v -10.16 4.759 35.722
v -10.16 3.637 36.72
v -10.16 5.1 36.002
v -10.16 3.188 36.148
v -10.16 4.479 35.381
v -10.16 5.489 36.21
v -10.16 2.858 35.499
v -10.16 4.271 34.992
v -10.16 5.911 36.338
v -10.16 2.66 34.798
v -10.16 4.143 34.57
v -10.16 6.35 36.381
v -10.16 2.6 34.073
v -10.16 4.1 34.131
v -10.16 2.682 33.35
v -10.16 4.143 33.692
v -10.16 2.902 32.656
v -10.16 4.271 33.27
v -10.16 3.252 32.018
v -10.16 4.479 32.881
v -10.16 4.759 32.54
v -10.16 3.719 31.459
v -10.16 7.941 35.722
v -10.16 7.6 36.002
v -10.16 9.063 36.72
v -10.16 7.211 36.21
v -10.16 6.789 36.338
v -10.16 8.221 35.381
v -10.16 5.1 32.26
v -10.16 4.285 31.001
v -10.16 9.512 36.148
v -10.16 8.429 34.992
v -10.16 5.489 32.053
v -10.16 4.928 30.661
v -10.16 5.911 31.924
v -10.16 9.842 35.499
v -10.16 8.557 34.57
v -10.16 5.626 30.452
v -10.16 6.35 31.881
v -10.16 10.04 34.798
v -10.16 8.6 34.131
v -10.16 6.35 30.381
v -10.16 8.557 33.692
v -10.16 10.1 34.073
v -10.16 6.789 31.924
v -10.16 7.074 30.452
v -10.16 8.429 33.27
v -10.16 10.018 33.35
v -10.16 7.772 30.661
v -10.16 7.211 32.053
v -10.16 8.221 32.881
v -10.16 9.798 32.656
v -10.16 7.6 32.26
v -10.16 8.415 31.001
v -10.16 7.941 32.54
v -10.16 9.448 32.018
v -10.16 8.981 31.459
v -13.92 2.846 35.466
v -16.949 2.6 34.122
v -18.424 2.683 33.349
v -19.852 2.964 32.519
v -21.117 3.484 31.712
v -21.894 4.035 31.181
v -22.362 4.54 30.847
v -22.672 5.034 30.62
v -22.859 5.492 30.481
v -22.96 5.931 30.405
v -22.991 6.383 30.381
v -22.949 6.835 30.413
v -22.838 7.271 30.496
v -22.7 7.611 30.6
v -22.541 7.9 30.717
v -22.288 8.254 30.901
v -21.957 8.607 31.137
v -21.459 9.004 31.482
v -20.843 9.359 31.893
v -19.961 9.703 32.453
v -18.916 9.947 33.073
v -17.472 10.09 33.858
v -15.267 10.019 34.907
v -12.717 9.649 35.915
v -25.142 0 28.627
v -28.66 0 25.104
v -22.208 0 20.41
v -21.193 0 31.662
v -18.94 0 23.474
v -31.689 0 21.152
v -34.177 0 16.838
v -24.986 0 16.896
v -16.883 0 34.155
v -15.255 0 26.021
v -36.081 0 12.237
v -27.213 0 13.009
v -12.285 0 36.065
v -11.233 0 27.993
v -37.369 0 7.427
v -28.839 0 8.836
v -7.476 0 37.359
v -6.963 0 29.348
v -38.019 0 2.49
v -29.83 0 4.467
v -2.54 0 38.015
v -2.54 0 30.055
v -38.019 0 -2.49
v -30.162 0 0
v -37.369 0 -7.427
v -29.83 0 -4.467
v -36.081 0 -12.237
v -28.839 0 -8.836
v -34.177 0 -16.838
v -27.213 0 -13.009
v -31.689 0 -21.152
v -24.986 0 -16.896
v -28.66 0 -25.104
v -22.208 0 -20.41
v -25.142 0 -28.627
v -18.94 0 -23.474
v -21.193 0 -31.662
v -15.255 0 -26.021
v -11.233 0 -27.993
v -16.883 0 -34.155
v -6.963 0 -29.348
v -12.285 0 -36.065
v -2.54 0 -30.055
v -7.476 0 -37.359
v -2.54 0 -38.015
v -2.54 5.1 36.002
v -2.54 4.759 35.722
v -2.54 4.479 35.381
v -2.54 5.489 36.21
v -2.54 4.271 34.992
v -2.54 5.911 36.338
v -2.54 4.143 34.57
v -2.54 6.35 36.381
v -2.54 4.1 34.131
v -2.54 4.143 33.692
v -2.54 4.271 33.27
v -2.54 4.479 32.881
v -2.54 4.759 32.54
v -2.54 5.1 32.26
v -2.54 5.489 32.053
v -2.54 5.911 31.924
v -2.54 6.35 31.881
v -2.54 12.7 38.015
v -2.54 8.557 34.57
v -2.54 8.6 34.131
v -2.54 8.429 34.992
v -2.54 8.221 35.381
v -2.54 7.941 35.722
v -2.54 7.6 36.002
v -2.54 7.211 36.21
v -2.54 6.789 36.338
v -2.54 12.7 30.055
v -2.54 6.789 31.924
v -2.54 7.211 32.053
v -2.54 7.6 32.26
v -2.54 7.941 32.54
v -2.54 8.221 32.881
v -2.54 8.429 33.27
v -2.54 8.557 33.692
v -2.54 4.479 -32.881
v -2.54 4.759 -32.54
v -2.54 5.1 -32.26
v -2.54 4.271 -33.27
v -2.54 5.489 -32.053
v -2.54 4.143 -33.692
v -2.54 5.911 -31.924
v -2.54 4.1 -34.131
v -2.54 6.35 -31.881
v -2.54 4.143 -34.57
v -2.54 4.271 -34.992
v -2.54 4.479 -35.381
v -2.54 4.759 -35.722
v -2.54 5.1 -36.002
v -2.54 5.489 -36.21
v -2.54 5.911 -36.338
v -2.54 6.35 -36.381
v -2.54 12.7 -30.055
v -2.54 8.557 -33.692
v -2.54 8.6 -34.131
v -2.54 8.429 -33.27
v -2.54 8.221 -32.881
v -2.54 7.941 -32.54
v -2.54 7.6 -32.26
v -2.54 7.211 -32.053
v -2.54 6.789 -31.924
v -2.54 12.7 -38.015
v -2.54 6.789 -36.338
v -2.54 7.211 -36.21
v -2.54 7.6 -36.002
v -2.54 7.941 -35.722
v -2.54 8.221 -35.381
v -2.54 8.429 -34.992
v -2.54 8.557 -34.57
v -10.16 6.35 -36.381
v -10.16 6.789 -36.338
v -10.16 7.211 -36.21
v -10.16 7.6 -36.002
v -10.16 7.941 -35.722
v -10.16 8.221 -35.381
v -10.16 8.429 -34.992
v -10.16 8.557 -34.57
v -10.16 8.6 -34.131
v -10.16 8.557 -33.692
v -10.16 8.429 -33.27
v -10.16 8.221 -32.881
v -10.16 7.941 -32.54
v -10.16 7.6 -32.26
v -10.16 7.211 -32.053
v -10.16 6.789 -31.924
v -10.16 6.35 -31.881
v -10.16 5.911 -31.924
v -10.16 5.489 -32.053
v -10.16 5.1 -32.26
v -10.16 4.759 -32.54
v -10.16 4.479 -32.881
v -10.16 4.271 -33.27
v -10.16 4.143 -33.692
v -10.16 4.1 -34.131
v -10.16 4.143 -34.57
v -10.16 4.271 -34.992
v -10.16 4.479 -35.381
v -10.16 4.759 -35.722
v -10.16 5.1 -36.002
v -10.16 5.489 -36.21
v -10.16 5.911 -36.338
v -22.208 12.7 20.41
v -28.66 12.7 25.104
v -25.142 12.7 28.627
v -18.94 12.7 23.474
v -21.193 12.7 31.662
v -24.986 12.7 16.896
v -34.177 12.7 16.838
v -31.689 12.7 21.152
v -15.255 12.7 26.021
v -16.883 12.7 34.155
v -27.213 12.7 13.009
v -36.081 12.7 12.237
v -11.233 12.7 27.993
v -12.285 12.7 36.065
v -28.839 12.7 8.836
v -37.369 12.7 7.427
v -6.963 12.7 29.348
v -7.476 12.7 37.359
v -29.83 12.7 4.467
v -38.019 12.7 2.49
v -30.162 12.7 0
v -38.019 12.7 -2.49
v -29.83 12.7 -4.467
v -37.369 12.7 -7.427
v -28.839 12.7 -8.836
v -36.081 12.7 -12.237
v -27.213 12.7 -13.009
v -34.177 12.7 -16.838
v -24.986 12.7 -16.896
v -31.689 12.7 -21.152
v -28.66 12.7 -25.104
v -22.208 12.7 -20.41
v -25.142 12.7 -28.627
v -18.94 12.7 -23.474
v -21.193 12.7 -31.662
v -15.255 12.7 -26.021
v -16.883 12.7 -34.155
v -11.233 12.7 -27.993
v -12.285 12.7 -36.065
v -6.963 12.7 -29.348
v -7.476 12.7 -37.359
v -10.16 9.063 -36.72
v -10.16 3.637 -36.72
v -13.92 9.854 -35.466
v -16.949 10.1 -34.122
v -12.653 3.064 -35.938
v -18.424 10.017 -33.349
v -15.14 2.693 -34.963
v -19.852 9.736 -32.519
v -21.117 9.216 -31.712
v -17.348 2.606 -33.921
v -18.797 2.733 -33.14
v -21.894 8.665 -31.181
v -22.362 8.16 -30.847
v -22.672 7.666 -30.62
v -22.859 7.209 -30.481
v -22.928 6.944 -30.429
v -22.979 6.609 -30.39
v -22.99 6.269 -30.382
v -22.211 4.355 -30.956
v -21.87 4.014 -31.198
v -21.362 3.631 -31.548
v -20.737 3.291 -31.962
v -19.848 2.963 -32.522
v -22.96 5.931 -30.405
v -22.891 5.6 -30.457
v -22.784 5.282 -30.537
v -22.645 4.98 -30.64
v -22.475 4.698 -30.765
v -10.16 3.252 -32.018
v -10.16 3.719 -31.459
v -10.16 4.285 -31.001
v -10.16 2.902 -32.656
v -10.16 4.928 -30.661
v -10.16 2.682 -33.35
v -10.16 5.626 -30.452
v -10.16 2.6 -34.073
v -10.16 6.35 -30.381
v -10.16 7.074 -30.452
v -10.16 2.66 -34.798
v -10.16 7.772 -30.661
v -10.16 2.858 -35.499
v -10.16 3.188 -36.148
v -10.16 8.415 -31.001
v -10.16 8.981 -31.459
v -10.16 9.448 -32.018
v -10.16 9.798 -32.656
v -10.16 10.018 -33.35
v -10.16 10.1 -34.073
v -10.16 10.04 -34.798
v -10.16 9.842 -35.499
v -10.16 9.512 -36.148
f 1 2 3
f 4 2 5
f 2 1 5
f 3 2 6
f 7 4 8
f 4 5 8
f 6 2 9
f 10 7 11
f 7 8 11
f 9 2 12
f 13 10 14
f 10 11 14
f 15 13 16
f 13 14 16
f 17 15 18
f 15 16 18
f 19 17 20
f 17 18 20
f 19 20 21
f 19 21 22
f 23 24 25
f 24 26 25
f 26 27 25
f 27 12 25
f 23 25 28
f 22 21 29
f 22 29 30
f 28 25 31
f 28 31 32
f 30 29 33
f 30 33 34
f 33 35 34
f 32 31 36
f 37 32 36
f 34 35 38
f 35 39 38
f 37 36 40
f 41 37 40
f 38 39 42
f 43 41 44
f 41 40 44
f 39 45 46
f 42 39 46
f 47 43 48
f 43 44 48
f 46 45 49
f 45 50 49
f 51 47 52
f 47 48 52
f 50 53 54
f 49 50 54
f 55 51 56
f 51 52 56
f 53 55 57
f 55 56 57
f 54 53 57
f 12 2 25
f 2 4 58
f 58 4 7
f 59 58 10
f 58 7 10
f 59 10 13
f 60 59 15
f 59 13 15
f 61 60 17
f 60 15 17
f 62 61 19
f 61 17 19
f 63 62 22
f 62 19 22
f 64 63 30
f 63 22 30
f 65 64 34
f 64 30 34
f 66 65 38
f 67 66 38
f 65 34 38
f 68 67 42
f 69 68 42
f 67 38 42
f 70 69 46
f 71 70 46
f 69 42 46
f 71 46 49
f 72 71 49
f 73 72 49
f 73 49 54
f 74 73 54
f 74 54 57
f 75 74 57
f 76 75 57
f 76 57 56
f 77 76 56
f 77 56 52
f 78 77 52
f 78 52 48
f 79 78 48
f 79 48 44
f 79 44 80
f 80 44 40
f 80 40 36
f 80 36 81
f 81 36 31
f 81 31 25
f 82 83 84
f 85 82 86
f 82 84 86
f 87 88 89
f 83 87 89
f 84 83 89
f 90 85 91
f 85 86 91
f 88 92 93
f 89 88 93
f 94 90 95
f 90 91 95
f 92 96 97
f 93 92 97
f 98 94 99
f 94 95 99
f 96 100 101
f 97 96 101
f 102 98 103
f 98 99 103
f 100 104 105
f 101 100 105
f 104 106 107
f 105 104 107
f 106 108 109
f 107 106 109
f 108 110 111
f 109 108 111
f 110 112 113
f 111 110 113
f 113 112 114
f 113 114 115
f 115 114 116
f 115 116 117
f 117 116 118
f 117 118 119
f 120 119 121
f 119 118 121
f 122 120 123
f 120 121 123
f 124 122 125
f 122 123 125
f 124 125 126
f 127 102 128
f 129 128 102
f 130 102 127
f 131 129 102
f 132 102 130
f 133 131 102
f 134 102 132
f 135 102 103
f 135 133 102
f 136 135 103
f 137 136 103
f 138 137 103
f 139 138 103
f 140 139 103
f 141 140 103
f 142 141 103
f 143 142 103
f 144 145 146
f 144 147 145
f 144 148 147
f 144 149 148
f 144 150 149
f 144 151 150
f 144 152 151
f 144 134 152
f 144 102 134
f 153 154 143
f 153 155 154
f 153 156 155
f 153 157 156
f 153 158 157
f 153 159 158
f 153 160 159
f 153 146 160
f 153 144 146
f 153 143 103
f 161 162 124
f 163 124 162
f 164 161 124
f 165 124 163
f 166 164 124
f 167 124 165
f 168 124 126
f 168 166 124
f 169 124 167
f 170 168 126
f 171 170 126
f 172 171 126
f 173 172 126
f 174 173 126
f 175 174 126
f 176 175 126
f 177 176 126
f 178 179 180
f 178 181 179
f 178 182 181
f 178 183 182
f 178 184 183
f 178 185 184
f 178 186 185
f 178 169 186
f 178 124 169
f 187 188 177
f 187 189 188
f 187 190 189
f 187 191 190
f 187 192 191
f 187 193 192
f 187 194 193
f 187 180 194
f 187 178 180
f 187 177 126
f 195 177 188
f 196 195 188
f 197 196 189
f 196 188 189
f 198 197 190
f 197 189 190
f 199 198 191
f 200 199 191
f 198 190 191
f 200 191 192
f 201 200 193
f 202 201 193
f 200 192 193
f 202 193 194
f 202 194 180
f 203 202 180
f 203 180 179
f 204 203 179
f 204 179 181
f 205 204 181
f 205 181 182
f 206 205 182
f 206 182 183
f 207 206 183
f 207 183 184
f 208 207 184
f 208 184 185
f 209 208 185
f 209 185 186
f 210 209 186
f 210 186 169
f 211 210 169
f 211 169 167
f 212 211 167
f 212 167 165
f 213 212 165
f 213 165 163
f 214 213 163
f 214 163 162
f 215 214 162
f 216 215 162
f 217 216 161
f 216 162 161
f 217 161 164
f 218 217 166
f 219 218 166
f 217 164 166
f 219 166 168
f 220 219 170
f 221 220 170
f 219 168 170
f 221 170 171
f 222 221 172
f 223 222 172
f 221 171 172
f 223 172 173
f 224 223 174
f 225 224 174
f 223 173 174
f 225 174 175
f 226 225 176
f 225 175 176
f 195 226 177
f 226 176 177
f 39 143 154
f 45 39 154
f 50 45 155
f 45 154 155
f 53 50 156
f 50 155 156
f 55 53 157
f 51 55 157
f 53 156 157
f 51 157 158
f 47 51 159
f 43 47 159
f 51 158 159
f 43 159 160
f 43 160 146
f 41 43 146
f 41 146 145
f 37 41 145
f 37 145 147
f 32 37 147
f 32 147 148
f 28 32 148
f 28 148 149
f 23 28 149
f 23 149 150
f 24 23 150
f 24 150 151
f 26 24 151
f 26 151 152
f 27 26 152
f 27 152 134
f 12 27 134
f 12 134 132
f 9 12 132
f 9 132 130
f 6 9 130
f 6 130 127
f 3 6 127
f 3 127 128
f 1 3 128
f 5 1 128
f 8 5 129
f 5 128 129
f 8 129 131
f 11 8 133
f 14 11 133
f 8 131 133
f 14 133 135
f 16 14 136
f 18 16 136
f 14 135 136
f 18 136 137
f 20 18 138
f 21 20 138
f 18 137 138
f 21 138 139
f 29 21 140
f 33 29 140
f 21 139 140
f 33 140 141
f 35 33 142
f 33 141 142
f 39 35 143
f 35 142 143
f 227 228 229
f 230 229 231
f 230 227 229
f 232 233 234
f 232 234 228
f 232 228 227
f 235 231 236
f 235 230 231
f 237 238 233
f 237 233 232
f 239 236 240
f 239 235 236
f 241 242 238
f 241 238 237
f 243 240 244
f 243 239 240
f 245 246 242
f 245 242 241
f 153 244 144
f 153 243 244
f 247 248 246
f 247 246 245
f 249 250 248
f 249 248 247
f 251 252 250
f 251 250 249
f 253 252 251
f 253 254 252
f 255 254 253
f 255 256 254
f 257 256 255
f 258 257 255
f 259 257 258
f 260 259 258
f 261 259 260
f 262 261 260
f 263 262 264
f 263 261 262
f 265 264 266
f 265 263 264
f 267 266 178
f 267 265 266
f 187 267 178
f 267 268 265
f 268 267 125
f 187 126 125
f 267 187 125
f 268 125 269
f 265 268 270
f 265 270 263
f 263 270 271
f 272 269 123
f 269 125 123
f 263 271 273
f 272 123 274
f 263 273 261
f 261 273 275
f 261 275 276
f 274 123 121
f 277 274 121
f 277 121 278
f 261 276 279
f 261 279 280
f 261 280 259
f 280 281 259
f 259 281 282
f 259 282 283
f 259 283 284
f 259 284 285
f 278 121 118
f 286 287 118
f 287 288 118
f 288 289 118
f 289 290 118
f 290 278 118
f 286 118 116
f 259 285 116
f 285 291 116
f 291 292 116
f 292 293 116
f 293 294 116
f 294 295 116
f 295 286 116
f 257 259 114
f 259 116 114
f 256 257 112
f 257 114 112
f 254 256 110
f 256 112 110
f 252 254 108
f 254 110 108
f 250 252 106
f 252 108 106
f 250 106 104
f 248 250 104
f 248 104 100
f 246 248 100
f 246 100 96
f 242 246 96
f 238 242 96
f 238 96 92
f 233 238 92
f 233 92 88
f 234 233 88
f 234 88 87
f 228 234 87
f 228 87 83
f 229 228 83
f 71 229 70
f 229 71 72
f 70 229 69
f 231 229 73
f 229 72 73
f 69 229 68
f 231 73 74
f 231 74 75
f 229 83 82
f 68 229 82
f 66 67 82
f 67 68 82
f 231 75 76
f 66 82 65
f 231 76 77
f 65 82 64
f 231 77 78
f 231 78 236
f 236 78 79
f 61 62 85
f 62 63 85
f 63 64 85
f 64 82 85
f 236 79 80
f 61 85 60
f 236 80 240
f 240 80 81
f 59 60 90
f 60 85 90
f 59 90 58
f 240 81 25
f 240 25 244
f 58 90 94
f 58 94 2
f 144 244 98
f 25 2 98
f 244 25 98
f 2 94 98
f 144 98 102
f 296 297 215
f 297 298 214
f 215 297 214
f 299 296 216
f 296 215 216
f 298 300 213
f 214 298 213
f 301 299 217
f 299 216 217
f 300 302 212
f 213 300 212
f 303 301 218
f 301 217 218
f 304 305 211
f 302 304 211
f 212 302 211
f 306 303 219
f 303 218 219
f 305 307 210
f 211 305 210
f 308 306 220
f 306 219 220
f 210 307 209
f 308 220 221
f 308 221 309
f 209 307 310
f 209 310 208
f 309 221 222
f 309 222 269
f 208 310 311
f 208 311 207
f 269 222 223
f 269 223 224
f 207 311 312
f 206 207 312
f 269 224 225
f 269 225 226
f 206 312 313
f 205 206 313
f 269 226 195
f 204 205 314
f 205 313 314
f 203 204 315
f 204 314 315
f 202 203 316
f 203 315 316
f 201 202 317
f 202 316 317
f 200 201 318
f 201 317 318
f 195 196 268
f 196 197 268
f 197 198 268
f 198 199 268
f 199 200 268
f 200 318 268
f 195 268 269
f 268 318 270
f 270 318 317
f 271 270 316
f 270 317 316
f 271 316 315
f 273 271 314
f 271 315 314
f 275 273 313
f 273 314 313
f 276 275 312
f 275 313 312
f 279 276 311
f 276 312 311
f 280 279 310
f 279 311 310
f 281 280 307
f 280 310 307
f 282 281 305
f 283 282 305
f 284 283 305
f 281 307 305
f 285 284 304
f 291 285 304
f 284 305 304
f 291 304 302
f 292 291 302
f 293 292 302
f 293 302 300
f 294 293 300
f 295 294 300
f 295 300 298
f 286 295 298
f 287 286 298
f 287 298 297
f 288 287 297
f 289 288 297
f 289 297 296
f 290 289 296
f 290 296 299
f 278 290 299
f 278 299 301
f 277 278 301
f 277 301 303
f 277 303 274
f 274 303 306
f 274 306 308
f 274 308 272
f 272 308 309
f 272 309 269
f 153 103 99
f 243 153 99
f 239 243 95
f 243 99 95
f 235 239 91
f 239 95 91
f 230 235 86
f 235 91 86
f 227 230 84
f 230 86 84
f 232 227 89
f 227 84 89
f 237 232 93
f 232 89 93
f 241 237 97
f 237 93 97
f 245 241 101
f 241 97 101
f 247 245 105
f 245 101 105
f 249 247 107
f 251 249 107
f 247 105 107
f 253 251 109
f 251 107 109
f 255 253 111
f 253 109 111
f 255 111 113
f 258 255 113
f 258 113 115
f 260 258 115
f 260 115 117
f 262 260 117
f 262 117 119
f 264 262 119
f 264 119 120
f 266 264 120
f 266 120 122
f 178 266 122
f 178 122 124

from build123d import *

# Parameters (mm, degrees)
BOSS_EXTRUDE1_DEPTH = 12.7
SKETCH2_R           = 2.25
CUT_EXTRUDE1_DEPTH  = 39.1
CUT_EXTRUDE2_START  = -10.16
SKETCH3_R           = 3.75
CUT_EXTRUDE2_DEPTH  = 28.9400001
SKETCH4_W           = 2.54
SKETCH4_H           = 76.2
CUT_EXTRUDE3_DEPTH  = 13.7000001


with BuildPart() as part:
    # Sketch1 → Boss-Extrude1 (new body)
    with BuildSketch(Plane(origin=(0, 0, 0), x_dir=(1, 0, 0), z_dir=(0, 1, 0))):
        with BuildLine():
            Line((0, 30.1625), (0, 38.1))
            ThreePointArc((0, 38.1), (-38.1, 0), (0, -38.1))
            Line((0, -38.1), (0, -30.1625))
            ThreePointArc((0, -30.1625), (-30.1625, 0), (0, 30.1625))
        make_face()
    extrude(amount=BOSS_EXTRUDE1_DEPTH)

    # Sketch2 → Cut-Extrude1 (cut, through all)
    with BuildSketch(Plane(origin=(0, 0, 0), x_dir=(0, 0, -1), z_dir=(1, 0, 0))):
        with Locations((-34.13125, 6.35)):
            Circle(SKETCH2_R)
        with Locations((34.13125, 6.35)):
            Circle(SKETCH2_R)
    extrude(amount=-CUT_EXTRUDE1_DEPTH, mode=Mode.SUBTRACT)

    # Sketch3 → Cut-Extrude2 (cut, through all)
    with BuildSketch(Plane(origin=(0, 0, 0), x_dir=(0, 0, -1), z_dir=(1, 0, 0)).offset(CUT_EXTRUDE2_START)):
        with Locations((34.13125, 6.35)):
            Circle(SKETCH3_R)
        with Locations((-34.13125, 6.35)):
            Circle(SKETCH3_R)
    extrude(amount=-CUT_EXTRUDE2_DEPTH, mode=Mode.SUBTRACT)

    # Sketch4 → Cut-Extrude3 (cut, through all)
    with BuildSketch(Plane(origin=(0, 12.7, 0), x_dir=(1, 0, 0), z_dir=(0, 1, 0))):
        with Locations((-1.27, 0)):
            Rectangle(SKETCH4_W, SKETCH4_H)
    extrude(amount=-CUT_EXTRUDE3_DEPTH, mode=Mode.SUBTRACT)


solid = part.part
